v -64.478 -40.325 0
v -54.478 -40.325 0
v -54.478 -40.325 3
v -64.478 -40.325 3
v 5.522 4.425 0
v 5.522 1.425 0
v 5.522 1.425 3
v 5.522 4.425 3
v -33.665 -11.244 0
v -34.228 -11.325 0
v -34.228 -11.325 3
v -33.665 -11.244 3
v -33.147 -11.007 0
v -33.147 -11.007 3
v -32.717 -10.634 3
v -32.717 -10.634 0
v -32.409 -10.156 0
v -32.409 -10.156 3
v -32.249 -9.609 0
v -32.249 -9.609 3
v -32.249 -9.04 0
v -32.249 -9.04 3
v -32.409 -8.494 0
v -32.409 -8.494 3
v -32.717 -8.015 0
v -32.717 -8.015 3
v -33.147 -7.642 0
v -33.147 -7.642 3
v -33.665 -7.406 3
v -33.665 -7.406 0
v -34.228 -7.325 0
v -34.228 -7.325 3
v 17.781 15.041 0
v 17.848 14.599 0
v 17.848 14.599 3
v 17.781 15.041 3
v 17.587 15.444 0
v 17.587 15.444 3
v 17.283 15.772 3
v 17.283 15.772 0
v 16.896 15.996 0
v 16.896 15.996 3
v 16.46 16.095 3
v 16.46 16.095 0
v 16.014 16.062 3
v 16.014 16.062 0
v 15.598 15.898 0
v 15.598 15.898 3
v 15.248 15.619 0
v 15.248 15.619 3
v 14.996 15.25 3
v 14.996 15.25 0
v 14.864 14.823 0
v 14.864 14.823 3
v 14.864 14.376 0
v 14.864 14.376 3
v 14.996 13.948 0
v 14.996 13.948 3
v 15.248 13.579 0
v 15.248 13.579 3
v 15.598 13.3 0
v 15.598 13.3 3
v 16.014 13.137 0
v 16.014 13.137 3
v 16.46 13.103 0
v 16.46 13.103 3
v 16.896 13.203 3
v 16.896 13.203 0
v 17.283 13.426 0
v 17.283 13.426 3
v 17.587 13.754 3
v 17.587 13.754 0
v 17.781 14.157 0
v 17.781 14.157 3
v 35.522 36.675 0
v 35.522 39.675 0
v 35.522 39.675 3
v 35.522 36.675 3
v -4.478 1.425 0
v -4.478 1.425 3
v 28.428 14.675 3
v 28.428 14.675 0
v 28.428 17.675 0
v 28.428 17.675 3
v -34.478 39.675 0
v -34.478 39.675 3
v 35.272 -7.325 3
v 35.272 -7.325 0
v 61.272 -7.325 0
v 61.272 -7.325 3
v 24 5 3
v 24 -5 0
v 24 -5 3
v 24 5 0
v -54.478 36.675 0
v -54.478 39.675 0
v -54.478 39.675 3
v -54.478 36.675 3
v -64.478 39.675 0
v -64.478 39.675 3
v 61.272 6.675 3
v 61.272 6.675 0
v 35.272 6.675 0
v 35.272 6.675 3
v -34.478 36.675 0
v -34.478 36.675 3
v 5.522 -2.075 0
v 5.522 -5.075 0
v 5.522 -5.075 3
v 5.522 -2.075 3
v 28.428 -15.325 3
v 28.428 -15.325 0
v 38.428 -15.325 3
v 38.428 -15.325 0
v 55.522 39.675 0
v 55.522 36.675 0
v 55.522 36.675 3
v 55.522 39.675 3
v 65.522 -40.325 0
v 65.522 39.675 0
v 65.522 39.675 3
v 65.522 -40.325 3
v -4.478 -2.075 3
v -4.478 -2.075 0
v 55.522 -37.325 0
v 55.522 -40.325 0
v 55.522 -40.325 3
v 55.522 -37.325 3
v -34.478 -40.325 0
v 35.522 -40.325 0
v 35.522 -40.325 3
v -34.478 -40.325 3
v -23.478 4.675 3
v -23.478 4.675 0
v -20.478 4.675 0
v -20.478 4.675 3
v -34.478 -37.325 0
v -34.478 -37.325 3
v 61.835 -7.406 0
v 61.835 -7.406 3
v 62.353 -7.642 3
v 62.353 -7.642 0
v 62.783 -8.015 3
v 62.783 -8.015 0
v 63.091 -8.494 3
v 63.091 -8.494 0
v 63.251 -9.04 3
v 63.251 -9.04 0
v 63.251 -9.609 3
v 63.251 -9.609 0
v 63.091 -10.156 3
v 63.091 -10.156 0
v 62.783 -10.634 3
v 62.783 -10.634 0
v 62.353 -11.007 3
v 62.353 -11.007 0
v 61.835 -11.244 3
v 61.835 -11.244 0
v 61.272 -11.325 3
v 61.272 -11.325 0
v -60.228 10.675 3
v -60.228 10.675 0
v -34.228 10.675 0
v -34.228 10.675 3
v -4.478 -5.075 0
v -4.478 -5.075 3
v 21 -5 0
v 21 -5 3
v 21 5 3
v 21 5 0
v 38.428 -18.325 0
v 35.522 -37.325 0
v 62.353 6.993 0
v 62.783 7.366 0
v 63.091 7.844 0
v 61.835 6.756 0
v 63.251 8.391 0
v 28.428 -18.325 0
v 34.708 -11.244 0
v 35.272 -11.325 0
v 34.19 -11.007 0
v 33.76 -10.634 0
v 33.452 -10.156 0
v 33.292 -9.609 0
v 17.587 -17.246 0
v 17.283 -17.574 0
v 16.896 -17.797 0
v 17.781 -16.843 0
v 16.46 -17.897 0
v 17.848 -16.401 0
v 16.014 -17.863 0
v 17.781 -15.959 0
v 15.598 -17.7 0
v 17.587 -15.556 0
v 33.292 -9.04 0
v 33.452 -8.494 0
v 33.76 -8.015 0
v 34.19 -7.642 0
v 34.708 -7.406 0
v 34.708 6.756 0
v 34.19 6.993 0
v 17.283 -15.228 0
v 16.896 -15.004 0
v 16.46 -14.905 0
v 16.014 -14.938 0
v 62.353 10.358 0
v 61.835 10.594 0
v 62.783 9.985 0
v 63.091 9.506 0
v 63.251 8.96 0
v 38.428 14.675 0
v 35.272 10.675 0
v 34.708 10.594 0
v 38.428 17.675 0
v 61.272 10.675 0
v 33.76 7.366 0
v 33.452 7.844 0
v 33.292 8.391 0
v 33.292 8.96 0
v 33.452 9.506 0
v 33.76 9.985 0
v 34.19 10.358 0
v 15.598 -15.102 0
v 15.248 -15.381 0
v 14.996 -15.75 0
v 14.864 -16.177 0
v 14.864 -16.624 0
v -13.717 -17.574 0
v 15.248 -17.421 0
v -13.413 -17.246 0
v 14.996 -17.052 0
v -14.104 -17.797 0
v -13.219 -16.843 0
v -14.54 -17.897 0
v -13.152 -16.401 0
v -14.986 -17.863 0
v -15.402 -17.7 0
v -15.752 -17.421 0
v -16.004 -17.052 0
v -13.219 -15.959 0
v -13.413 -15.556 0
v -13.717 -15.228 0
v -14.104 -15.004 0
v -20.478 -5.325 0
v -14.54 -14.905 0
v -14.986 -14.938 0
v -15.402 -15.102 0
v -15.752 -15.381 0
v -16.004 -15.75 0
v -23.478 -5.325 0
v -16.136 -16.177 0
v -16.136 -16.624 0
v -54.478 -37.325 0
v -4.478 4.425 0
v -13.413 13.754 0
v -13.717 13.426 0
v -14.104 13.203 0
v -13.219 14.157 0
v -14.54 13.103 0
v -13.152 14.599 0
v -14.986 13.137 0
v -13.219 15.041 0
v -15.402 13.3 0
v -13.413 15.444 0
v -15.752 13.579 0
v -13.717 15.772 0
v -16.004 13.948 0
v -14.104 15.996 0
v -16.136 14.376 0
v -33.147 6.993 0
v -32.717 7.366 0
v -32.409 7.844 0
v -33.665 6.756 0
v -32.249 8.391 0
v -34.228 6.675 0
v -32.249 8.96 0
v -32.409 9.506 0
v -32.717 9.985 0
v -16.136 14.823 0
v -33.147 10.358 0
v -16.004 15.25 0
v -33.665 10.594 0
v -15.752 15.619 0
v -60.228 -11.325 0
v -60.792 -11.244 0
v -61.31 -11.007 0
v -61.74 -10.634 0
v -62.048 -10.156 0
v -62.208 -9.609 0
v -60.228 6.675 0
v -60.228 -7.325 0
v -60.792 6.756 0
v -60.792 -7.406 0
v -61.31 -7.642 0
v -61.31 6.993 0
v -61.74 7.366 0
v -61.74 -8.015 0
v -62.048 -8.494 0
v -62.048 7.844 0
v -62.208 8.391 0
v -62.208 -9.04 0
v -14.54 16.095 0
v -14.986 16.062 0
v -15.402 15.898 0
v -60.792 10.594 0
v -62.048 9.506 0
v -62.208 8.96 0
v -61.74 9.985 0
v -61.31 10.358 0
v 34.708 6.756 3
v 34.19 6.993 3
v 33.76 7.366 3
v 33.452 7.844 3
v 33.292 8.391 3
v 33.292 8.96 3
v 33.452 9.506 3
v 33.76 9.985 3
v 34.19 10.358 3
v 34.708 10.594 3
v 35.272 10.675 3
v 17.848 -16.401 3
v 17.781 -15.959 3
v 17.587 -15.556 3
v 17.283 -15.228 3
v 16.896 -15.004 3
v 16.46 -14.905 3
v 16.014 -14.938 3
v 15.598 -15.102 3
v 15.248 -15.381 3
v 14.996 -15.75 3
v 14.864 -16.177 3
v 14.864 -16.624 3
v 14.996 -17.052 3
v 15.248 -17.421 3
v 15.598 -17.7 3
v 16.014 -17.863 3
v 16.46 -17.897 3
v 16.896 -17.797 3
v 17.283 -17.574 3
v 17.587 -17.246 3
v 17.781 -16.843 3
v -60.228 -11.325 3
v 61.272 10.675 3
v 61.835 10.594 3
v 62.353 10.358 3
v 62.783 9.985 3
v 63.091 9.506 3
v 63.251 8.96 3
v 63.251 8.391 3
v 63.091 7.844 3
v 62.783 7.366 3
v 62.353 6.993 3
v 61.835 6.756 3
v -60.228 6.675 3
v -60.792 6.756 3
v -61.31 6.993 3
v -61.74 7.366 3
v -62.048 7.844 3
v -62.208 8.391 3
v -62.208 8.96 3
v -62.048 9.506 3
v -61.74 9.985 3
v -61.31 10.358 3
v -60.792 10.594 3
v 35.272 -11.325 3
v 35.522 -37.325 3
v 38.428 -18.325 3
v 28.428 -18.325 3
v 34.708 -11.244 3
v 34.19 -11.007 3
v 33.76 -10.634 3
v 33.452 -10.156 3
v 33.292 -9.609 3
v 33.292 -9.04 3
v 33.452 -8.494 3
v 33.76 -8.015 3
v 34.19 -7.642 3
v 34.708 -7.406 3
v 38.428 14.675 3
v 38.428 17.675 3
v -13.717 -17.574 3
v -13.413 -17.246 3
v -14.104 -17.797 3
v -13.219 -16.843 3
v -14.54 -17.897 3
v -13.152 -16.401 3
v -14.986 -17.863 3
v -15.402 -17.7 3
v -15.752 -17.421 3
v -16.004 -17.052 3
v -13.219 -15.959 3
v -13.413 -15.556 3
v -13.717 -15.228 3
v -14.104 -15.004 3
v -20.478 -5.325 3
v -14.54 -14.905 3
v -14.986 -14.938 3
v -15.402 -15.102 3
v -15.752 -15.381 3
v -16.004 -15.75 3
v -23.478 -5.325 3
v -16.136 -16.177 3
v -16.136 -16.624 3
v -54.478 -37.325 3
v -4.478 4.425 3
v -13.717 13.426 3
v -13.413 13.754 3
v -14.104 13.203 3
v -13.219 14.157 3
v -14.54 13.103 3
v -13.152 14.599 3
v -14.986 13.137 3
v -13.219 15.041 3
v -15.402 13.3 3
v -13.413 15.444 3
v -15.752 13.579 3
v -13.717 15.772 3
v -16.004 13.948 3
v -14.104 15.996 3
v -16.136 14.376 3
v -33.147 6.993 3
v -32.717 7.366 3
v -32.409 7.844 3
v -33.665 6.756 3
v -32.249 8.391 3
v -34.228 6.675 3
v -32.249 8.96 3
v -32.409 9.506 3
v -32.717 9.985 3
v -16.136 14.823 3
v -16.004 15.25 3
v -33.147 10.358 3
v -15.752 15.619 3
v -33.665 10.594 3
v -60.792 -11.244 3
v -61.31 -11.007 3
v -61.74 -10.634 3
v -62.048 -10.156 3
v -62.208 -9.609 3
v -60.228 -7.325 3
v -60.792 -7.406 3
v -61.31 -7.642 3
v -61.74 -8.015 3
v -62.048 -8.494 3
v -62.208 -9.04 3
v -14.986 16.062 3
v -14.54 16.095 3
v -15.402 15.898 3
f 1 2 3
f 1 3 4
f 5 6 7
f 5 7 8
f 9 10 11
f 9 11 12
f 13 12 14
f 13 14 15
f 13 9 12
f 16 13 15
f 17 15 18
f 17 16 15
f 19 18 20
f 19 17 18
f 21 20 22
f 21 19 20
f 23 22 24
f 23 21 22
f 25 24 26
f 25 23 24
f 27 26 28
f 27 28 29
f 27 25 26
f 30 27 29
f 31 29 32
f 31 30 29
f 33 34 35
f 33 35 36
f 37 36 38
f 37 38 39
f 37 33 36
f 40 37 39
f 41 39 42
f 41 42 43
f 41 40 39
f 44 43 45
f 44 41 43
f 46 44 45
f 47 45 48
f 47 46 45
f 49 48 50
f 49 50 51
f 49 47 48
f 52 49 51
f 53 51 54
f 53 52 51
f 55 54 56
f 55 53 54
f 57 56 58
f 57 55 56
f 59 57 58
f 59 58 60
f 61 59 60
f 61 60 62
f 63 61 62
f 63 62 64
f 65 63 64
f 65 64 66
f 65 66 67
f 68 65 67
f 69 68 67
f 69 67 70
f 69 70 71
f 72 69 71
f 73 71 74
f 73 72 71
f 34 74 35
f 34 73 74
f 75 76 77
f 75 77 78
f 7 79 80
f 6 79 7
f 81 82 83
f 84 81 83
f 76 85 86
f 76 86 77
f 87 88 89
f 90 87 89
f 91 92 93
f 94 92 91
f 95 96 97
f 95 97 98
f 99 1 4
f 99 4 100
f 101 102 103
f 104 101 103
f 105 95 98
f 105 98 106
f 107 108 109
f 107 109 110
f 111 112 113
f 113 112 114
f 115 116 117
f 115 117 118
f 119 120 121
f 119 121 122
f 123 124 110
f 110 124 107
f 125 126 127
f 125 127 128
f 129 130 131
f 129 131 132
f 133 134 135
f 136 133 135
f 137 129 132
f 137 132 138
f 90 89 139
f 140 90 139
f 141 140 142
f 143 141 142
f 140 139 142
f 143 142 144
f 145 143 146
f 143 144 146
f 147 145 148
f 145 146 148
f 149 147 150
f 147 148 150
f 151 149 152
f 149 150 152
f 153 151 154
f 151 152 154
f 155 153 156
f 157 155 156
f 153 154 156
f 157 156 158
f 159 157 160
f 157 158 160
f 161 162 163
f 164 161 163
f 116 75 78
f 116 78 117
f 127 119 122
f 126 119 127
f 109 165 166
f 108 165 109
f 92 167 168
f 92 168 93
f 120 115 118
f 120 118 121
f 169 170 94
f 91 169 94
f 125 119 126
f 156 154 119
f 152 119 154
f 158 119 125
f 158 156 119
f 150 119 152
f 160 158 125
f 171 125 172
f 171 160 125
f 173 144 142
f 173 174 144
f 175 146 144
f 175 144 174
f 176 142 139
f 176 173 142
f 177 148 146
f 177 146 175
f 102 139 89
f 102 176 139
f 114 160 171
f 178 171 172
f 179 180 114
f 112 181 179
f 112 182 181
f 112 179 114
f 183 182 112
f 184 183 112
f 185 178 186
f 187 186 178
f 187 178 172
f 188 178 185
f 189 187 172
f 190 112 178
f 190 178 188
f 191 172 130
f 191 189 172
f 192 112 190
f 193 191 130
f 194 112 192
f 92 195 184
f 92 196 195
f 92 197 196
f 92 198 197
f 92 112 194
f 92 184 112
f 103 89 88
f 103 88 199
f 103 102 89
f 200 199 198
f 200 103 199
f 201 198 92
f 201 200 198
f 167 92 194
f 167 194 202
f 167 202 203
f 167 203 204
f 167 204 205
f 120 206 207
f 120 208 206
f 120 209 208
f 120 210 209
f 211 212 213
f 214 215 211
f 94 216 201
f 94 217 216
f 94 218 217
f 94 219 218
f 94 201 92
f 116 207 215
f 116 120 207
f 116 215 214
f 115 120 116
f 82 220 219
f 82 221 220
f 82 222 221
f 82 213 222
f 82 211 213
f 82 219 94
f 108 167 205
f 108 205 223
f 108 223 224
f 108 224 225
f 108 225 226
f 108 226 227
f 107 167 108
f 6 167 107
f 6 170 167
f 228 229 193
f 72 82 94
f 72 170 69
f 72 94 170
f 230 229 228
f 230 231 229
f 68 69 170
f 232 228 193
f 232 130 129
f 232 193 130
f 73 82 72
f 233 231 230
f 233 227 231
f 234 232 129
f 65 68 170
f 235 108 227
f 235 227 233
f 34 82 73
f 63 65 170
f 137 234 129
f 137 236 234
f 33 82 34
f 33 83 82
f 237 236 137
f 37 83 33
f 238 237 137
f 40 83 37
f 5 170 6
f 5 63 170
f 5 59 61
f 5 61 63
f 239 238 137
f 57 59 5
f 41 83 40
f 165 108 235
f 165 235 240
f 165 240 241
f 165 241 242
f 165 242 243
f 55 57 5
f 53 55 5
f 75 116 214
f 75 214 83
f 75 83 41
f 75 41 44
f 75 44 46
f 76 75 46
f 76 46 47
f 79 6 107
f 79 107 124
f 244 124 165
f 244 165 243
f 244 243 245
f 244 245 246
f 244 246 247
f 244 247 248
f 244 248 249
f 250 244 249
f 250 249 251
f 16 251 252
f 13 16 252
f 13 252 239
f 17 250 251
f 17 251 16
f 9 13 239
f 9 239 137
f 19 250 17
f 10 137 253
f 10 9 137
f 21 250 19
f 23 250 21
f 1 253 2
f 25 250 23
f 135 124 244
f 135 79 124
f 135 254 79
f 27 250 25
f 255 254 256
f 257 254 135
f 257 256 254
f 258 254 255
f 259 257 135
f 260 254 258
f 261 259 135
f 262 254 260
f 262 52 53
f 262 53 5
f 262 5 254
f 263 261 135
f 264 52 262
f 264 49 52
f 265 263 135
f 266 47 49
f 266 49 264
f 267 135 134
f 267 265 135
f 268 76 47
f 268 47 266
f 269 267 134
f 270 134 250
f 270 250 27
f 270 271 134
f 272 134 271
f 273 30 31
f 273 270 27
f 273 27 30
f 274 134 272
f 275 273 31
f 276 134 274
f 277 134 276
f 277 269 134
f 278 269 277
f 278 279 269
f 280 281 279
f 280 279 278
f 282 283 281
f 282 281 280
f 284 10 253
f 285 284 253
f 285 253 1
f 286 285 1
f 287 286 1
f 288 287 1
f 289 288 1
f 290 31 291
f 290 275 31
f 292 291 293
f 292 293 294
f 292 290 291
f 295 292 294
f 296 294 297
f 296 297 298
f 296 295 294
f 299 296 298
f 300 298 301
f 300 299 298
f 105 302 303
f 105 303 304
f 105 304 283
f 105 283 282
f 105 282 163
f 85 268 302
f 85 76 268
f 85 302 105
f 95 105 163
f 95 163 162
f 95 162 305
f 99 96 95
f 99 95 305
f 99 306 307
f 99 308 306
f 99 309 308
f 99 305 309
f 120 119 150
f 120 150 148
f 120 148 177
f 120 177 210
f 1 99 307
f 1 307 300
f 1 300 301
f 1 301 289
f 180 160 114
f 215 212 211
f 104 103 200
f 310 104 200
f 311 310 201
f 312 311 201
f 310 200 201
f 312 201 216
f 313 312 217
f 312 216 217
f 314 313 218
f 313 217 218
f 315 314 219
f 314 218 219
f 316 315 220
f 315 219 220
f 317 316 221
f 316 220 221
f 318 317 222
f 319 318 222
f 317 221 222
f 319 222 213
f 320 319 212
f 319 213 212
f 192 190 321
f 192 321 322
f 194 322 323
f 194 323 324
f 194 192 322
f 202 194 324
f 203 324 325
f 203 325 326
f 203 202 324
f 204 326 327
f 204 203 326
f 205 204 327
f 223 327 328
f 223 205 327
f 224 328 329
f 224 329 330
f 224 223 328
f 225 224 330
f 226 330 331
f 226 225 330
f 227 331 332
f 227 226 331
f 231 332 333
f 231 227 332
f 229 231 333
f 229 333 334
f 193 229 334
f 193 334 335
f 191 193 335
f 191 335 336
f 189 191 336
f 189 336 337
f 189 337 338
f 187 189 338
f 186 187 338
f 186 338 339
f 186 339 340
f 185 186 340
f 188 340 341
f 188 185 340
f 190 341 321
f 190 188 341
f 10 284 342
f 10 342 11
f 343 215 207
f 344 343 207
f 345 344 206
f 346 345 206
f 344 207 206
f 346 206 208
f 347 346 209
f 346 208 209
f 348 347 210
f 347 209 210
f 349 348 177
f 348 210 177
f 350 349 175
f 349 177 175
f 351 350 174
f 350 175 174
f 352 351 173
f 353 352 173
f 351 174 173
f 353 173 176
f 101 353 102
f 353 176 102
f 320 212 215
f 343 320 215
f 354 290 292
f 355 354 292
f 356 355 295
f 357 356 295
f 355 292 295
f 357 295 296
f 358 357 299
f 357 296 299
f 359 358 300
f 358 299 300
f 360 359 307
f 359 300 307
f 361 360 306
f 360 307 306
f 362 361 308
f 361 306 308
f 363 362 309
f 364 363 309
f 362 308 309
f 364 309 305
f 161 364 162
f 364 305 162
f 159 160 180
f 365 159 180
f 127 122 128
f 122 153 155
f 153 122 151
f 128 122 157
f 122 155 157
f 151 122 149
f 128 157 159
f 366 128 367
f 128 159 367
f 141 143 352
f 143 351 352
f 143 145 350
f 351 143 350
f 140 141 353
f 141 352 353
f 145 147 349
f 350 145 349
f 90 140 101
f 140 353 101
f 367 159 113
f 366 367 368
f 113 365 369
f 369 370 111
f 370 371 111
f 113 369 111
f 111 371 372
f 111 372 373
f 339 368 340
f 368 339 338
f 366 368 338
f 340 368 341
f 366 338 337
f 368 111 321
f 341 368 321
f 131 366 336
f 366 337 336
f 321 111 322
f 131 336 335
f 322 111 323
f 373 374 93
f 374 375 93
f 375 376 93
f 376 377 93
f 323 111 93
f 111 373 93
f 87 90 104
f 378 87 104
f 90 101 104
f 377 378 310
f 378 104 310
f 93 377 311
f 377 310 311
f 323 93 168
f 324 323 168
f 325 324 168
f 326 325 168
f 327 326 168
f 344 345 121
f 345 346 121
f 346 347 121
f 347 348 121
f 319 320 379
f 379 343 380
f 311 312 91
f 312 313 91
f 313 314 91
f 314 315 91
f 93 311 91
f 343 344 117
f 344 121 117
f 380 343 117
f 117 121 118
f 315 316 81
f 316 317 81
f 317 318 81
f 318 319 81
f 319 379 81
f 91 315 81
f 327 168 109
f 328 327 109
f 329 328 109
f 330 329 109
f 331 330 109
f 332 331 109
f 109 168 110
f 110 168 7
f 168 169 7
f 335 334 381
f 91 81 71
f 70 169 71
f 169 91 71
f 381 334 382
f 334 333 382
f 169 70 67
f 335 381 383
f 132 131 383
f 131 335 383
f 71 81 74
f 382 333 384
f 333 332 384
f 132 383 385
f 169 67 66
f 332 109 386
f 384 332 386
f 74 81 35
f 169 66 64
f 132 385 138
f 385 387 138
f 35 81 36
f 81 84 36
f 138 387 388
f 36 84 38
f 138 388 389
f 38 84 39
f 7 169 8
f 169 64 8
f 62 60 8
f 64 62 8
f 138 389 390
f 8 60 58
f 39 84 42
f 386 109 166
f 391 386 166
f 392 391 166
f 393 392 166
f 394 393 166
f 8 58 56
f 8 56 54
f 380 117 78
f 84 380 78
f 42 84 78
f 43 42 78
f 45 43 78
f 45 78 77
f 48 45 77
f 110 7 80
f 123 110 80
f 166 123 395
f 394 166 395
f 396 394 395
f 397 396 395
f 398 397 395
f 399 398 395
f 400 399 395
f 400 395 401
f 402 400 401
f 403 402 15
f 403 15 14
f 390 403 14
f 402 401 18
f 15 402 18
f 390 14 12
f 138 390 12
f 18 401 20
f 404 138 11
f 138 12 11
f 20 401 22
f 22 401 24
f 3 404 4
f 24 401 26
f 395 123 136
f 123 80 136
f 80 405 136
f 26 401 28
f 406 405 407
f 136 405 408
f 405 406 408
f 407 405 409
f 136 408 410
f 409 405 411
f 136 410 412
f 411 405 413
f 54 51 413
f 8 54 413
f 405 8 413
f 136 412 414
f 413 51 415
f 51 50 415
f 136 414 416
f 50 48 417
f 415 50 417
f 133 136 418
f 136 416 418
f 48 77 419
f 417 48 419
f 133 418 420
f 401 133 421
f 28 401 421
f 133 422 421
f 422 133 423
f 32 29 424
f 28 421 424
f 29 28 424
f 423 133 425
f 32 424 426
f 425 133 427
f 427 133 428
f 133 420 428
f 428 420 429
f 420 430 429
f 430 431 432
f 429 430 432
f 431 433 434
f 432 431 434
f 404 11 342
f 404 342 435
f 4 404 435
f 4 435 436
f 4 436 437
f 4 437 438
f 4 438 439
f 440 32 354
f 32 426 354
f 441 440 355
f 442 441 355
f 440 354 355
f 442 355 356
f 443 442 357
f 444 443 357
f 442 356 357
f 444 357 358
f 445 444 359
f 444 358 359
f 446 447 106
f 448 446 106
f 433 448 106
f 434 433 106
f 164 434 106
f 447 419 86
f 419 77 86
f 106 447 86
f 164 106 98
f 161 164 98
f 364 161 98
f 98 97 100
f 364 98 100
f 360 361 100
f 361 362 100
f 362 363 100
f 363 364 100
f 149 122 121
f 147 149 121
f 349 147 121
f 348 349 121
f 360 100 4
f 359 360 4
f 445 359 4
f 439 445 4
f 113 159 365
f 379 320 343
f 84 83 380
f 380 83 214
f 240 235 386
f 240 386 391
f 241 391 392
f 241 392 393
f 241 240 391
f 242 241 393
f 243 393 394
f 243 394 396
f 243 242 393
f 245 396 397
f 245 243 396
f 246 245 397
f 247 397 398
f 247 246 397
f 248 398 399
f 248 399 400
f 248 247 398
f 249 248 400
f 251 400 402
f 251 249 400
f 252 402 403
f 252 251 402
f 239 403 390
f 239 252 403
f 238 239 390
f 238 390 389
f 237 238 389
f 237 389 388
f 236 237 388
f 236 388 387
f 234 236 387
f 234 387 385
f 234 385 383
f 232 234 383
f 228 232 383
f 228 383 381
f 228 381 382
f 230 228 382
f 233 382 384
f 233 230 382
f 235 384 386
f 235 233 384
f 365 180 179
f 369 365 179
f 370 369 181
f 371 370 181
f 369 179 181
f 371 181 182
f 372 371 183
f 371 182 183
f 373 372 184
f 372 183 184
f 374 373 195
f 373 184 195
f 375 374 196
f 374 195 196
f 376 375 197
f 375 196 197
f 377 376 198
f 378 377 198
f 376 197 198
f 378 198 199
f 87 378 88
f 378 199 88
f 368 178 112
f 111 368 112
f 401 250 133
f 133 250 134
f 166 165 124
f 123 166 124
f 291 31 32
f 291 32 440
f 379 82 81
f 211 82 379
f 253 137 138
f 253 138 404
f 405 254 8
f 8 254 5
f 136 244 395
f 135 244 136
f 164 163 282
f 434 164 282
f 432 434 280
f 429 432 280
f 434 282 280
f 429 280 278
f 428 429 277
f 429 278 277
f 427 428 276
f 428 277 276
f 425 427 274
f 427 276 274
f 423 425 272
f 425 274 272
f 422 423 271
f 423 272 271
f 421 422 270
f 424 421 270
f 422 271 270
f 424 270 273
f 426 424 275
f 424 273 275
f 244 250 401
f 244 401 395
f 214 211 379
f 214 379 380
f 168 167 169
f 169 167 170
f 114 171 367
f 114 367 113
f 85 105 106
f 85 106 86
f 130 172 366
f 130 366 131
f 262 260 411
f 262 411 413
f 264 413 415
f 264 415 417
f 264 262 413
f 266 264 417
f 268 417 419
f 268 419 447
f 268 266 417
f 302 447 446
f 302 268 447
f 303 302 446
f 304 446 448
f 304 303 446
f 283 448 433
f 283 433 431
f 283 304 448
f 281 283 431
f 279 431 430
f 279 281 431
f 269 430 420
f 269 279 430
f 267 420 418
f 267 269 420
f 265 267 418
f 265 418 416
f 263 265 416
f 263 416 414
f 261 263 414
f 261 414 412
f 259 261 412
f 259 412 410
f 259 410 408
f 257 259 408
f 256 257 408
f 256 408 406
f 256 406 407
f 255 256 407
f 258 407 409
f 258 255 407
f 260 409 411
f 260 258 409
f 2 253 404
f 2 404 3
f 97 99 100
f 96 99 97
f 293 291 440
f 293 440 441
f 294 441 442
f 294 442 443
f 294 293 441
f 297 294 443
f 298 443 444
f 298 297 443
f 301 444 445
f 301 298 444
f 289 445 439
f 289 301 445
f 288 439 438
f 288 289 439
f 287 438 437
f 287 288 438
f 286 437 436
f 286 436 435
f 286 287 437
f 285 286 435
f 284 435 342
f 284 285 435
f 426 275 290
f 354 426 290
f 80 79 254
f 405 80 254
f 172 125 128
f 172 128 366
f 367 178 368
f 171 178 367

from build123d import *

# Parameters (mm, degrees)
SKETCH1_R           = 1.5
SKETCH1_W           = 3
SKETCH1_H           = 10
SKETCH1_W_2         = 10
SKETCH1_H_2         = 3
BOSS_EXTRUDE1_DEPTH = 3


with BuildPart() as part:
    # Sketch1 → Boss-Extrude1 (new body)
    with BuildSketch(Plane.XY):
        Polygon((-54.478363627, 39.675247502), (-54.478363627, 36.675247502), (-34.478363627, 36.675247502), (-34.478363627, 39.675247502), (35.521636373, 39.675247502), (35.521636373, 36.675247502), (55.521636373, 36.675247502), (55.521636373, 39.675247502), (65.521636373, 39.675247502), (65.521636373, -40.324752498), (55.521636373, -40.324752498), (55.521636373, -37.324752498), (35.521636373, -37.324752498), (35.521636373, -40.324752498), (-34.478363627, -40.324752498), (-34.478363627, -37.324752498), (-54.478363627, -37.324752498), (-54.478363627, -40.324752498), (-64.478363627, -40.324752498), (-64.478363627, 39.675247502), align=None)
        with Locations((16.34767445, 14.599209425)):
            Circle(SKETCH1_R, mode=Mode.SUBTRACT)
        with Locations((-14.65232555, 14.599209425)):
            Circle(SKETCH1_R, mode=Mode.SUBTRACT)
        with Locations((16.34767445, -16.400790575)):
            Circle(SKETCH1_R, mode=Mode.SUBTRACT)
        with Locations((-14.65232555, -16.400790575)):
            Circle(SKETCH1_R, mode=Mode.SUBTRACT)
        with Locations((22.5, 0)):
            Rectangle(SKETCH1_W, SKETCH1_H, mode=Mode.SUBTRACT)
        with Locations((-21.978363627, -0.324752498)):
            Rectangle(SKETCH1_W, SKETCH1_H, mode=Mode.SUBTRACT)
        with BuildLine():
            Line((-60.228363627, 10.675247502), (-34.228363627, 10.675247502))
            ThreePointArc((-34.228363627, 10.675247502), (-32.228363627, 8.675247502), (-34.228363627, 6.675247502))
            Line((-34.228363627, 6.675247502), (-60.228363627, 6.675247502))
            ThreePointArc((-60.228363627, 6.675247502), (-62.228363627, 8.675247502), (-60.228363627, 10.675247502))
        make_face(mode=Mode.SUBTRACT)
        with BuildLine():
            Line((-34.228363627, -7.324752498), (-60.228363627, -7.324752498))
            ThreePointArc((-60.228363627, -7.324752498), (-62.228363627, -9.324752498), (-60.228363627, -11.324752498))
            Line((-60.228363627, -11.324752498), (-34.228363627, -11.324752498))
            ThreePointArc((-34.228363627, -11.324752498), (-32.228363627, -9.324752498), (-34.228363627, -7.324752498))
        make_face(mode=Mode.SUBTRACT)
        with BuildLine():
            Line((35.271636373, 10.675247502), (61.271636373, 10.675247502))
            ThreePointArc((61.271636373, 10.675247502), (63.271636373, 8.675247502), (61.271636373, 6.675247502))
            Line((61.271636373, 6.675247502), (35.271636373, 6.675247502))
            ThreePointArc((35.271636373, 6.675247502), (33.271636373, 8.675247502), (35.271636373, 10.675247502))
        make_face(mode=Mode.SUBTRACT)
        with BuildLine():
            Line((35.271636373, -7.324752498), (61.271636373, -7.324752498))
            ThreePointArc((61.271636373, -7.324752498), (63.271636373, -9.324752498), (61.271636373, -11.324752498))
            Line((61.271636373, -11.324752498), (35.271636373, -11.324752498))
            ThreePointArc((35.271636373, -11.324752498), (33.271636373, -9.324752498), (35.271636373, -7.324752498))
        make_face(mode=Mode.SUBTRACT)
        with Locations((33.427979094, -16.824752498)):
            Rectangle(SKETCH1_W_2, SKETCH1_H_2, mode=Mode.SUBTRACT)
        with Locations((33.427979094, 16.175247502)):
            Rectangle(SKETCH1_W_2, SKETCH1_H_2, mode=Mode.SUBTRACT)
        with Locations((0.521636373, -3.574752498)):
            Rectangle(SKETCH1_W_2, SKETCH1_H_2, mode=Mode.SUBTRACT)
        with Locations((0.521636373, 2.925247502)):
            Rectangle(SKETCH1_W_2, SKETCH1_H_2, mode=Mode.SUBTRACT)
    extrude(amount=BOSS_EXTRUDE1_DEPTH)


solid = part.part
